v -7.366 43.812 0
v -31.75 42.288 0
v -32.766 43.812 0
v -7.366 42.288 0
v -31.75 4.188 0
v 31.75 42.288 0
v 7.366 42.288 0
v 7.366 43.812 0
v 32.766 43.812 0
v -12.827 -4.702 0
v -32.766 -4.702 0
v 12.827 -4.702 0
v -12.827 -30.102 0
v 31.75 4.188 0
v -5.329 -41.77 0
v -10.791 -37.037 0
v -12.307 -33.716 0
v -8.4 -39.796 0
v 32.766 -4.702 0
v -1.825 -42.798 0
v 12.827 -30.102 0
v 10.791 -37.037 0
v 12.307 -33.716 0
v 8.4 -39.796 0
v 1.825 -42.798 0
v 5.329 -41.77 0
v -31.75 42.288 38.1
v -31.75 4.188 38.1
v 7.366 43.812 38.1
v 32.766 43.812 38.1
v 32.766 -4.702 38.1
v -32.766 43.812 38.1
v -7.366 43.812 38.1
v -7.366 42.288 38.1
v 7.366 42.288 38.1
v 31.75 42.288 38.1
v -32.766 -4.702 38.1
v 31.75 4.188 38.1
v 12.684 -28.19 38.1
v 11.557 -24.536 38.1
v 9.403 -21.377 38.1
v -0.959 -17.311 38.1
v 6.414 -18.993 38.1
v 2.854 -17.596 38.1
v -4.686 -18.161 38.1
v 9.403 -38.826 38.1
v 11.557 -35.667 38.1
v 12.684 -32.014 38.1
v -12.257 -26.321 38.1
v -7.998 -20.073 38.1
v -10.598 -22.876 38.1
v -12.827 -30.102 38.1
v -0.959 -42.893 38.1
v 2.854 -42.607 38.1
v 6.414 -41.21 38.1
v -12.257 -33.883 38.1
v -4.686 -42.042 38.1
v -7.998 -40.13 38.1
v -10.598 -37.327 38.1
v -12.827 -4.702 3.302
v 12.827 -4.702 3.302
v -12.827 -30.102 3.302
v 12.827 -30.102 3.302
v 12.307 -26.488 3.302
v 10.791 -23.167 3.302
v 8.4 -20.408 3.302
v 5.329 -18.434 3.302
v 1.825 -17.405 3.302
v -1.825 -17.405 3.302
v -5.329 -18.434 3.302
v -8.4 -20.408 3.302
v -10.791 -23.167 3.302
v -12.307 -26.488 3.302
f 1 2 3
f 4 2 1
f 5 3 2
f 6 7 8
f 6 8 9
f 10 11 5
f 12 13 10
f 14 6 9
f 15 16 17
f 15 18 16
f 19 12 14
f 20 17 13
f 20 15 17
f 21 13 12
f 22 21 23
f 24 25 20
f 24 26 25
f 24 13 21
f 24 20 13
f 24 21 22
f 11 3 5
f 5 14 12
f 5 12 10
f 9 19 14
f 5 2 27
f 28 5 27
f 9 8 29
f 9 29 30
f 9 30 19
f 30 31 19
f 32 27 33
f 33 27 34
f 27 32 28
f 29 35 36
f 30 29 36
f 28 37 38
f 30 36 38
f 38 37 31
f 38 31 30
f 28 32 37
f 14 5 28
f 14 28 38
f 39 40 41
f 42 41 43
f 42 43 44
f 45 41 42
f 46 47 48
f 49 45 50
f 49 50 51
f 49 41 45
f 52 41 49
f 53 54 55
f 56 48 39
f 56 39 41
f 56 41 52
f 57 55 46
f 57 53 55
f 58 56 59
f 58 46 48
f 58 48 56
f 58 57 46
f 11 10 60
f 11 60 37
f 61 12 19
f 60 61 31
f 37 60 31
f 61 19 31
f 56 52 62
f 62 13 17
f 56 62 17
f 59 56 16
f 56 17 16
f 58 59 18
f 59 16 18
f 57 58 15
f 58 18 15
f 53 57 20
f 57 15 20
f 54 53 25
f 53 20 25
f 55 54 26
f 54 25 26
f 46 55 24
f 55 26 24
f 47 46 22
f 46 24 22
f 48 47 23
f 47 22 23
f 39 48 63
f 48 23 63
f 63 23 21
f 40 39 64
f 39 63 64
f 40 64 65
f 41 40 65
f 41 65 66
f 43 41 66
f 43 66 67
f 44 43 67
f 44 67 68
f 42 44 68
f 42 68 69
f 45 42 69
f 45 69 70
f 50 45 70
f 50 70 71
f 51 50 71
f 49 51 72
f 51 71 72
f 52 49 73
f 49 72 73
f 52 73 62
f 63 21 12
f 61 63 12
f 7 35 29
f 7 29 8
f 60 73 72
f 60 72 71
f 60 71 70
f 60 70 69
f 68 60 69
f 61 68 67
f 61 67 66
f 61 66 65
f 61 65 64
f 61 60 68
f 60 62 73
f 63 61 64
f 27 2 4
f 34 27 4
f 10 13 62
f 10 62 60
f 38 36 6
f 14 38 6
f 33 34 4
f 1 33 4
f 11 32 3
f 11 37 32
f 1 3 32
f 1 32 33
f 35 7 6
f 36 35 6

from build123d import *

# Parameters (mm, degrees)
SKETCH1_R            = 12.827
BOSS_EXTRUDE1_DEPTH  = 38.1
SKETCH2_W            = 25.654
SKETCH2_H            = 25.4
BOSS_EXTRUDE2_DEPTH  = 3.302
SKETCH8_W            = 63.5
SKETCH8_H            = 38.1
BOSS_EXTRUDE6_DEPTH  = 8.89
SKETCH10_W           = 38.1
SKETCH10_H           = 46.99
BOSS_EXTRUDE7_DEPTH  = 1.016
SKETCH11_W           = 38.1
SKETCH11_H           = 46.99
BOSS_EXTRUDE8_DEPTH  = 1.016
SKETCH13_W           = 25.4
SKETCH13_H           = 38.1
BOSS_EXTRUDE9_DEPTH  = 1.524
SKETCH14_W           = 25.4
SKETCH14_H           = 38.1
BOSS_EXTRUDE10_DEPTH = 1.524


with BuildPart() as part:
    # Sketch1 → Boss-Extrude1 (new body)
    with BuildSketch(Plane.XY):
        with Locations(Location((0, -30.101764051, 0), (0, 0, 180))):
            Circle(SKETCH1_R)
    extrude(amount=BOSS_EXTRUDE1_DEPTH)

    # Sketch2 → Boss-Extrude2 (add)
    with BuildSketch(Plane.XY):
        with Locations((0, -17.401764051)):
            Rectangle(SKETCH2_W, SKETCH2_H)
    extrude(amount=BOSS_EXTRUDE2_DEPTH)

    # Sketch8 → Boss-Extrude6 (add)
    with BuildSketch(Plane(origin=(0, -4.701764051, 0), x_dir=(1, 0, 0), z_dir=(0, 1, 0))):
        with Locations((0, -19.05)):
            Rectangle(SKETCH8_W, SKETCH8_H)
    extrude(amount=BOSS_EXTRUDE6_DEPTH)

    # Sketch10 → Boss-Extrude7 (add)
    with BuildSketch(Plane(origin=(31.75, 0, 0), x_dir=(0, 0, -1), z_dir=(1, 0, 0))):
        with Locations((-19.05, 18.793235949)):
            Rectangle(SKETCH10_W, SKETCH10_H)
    extrude(amount=BOSS_EXTRUDE7_DEPTH)

    # Sketch11 → Boss-Extrude8 (add)
    with BuildSketch(Plane.ZY.offset(31.75)):
        with Locations((19.05, 18.793235949)):
            Rectangle(SKETCH11_W, SKETCH11_H)
    extrude(amount=BOSS_EXTRUDE8_DEPTH)

    # Sketch13 → Boss-Extrude9 (add)
    with BuildSketch(Plane(origin=(0, 42.288235949, 0), x_dir=(1, 0, 0), z_dir=(0, 1, 0))):
        with Locations((20.066, -19.05)):
            Rectangle(SKETCH13_W, SKETCH13_H)
    extrude(amount=BOSS_EXTRUDE9_DEPTH)

    # Sketch14 → Boss-Extrude10 (add)
    with BuildSketch(Plane(origin=(0, 42.288235949, 0), x_dir=(1, 0, 0), z_dir=(0, 1, 0))):
        with Locations((-20.066, -19.05)):
            Rectangle(SKETCH14_W, SKETCH14_H)
    extrude(amount=BOSS_EXTRUDE10_DEPTH)


solid = part.part
